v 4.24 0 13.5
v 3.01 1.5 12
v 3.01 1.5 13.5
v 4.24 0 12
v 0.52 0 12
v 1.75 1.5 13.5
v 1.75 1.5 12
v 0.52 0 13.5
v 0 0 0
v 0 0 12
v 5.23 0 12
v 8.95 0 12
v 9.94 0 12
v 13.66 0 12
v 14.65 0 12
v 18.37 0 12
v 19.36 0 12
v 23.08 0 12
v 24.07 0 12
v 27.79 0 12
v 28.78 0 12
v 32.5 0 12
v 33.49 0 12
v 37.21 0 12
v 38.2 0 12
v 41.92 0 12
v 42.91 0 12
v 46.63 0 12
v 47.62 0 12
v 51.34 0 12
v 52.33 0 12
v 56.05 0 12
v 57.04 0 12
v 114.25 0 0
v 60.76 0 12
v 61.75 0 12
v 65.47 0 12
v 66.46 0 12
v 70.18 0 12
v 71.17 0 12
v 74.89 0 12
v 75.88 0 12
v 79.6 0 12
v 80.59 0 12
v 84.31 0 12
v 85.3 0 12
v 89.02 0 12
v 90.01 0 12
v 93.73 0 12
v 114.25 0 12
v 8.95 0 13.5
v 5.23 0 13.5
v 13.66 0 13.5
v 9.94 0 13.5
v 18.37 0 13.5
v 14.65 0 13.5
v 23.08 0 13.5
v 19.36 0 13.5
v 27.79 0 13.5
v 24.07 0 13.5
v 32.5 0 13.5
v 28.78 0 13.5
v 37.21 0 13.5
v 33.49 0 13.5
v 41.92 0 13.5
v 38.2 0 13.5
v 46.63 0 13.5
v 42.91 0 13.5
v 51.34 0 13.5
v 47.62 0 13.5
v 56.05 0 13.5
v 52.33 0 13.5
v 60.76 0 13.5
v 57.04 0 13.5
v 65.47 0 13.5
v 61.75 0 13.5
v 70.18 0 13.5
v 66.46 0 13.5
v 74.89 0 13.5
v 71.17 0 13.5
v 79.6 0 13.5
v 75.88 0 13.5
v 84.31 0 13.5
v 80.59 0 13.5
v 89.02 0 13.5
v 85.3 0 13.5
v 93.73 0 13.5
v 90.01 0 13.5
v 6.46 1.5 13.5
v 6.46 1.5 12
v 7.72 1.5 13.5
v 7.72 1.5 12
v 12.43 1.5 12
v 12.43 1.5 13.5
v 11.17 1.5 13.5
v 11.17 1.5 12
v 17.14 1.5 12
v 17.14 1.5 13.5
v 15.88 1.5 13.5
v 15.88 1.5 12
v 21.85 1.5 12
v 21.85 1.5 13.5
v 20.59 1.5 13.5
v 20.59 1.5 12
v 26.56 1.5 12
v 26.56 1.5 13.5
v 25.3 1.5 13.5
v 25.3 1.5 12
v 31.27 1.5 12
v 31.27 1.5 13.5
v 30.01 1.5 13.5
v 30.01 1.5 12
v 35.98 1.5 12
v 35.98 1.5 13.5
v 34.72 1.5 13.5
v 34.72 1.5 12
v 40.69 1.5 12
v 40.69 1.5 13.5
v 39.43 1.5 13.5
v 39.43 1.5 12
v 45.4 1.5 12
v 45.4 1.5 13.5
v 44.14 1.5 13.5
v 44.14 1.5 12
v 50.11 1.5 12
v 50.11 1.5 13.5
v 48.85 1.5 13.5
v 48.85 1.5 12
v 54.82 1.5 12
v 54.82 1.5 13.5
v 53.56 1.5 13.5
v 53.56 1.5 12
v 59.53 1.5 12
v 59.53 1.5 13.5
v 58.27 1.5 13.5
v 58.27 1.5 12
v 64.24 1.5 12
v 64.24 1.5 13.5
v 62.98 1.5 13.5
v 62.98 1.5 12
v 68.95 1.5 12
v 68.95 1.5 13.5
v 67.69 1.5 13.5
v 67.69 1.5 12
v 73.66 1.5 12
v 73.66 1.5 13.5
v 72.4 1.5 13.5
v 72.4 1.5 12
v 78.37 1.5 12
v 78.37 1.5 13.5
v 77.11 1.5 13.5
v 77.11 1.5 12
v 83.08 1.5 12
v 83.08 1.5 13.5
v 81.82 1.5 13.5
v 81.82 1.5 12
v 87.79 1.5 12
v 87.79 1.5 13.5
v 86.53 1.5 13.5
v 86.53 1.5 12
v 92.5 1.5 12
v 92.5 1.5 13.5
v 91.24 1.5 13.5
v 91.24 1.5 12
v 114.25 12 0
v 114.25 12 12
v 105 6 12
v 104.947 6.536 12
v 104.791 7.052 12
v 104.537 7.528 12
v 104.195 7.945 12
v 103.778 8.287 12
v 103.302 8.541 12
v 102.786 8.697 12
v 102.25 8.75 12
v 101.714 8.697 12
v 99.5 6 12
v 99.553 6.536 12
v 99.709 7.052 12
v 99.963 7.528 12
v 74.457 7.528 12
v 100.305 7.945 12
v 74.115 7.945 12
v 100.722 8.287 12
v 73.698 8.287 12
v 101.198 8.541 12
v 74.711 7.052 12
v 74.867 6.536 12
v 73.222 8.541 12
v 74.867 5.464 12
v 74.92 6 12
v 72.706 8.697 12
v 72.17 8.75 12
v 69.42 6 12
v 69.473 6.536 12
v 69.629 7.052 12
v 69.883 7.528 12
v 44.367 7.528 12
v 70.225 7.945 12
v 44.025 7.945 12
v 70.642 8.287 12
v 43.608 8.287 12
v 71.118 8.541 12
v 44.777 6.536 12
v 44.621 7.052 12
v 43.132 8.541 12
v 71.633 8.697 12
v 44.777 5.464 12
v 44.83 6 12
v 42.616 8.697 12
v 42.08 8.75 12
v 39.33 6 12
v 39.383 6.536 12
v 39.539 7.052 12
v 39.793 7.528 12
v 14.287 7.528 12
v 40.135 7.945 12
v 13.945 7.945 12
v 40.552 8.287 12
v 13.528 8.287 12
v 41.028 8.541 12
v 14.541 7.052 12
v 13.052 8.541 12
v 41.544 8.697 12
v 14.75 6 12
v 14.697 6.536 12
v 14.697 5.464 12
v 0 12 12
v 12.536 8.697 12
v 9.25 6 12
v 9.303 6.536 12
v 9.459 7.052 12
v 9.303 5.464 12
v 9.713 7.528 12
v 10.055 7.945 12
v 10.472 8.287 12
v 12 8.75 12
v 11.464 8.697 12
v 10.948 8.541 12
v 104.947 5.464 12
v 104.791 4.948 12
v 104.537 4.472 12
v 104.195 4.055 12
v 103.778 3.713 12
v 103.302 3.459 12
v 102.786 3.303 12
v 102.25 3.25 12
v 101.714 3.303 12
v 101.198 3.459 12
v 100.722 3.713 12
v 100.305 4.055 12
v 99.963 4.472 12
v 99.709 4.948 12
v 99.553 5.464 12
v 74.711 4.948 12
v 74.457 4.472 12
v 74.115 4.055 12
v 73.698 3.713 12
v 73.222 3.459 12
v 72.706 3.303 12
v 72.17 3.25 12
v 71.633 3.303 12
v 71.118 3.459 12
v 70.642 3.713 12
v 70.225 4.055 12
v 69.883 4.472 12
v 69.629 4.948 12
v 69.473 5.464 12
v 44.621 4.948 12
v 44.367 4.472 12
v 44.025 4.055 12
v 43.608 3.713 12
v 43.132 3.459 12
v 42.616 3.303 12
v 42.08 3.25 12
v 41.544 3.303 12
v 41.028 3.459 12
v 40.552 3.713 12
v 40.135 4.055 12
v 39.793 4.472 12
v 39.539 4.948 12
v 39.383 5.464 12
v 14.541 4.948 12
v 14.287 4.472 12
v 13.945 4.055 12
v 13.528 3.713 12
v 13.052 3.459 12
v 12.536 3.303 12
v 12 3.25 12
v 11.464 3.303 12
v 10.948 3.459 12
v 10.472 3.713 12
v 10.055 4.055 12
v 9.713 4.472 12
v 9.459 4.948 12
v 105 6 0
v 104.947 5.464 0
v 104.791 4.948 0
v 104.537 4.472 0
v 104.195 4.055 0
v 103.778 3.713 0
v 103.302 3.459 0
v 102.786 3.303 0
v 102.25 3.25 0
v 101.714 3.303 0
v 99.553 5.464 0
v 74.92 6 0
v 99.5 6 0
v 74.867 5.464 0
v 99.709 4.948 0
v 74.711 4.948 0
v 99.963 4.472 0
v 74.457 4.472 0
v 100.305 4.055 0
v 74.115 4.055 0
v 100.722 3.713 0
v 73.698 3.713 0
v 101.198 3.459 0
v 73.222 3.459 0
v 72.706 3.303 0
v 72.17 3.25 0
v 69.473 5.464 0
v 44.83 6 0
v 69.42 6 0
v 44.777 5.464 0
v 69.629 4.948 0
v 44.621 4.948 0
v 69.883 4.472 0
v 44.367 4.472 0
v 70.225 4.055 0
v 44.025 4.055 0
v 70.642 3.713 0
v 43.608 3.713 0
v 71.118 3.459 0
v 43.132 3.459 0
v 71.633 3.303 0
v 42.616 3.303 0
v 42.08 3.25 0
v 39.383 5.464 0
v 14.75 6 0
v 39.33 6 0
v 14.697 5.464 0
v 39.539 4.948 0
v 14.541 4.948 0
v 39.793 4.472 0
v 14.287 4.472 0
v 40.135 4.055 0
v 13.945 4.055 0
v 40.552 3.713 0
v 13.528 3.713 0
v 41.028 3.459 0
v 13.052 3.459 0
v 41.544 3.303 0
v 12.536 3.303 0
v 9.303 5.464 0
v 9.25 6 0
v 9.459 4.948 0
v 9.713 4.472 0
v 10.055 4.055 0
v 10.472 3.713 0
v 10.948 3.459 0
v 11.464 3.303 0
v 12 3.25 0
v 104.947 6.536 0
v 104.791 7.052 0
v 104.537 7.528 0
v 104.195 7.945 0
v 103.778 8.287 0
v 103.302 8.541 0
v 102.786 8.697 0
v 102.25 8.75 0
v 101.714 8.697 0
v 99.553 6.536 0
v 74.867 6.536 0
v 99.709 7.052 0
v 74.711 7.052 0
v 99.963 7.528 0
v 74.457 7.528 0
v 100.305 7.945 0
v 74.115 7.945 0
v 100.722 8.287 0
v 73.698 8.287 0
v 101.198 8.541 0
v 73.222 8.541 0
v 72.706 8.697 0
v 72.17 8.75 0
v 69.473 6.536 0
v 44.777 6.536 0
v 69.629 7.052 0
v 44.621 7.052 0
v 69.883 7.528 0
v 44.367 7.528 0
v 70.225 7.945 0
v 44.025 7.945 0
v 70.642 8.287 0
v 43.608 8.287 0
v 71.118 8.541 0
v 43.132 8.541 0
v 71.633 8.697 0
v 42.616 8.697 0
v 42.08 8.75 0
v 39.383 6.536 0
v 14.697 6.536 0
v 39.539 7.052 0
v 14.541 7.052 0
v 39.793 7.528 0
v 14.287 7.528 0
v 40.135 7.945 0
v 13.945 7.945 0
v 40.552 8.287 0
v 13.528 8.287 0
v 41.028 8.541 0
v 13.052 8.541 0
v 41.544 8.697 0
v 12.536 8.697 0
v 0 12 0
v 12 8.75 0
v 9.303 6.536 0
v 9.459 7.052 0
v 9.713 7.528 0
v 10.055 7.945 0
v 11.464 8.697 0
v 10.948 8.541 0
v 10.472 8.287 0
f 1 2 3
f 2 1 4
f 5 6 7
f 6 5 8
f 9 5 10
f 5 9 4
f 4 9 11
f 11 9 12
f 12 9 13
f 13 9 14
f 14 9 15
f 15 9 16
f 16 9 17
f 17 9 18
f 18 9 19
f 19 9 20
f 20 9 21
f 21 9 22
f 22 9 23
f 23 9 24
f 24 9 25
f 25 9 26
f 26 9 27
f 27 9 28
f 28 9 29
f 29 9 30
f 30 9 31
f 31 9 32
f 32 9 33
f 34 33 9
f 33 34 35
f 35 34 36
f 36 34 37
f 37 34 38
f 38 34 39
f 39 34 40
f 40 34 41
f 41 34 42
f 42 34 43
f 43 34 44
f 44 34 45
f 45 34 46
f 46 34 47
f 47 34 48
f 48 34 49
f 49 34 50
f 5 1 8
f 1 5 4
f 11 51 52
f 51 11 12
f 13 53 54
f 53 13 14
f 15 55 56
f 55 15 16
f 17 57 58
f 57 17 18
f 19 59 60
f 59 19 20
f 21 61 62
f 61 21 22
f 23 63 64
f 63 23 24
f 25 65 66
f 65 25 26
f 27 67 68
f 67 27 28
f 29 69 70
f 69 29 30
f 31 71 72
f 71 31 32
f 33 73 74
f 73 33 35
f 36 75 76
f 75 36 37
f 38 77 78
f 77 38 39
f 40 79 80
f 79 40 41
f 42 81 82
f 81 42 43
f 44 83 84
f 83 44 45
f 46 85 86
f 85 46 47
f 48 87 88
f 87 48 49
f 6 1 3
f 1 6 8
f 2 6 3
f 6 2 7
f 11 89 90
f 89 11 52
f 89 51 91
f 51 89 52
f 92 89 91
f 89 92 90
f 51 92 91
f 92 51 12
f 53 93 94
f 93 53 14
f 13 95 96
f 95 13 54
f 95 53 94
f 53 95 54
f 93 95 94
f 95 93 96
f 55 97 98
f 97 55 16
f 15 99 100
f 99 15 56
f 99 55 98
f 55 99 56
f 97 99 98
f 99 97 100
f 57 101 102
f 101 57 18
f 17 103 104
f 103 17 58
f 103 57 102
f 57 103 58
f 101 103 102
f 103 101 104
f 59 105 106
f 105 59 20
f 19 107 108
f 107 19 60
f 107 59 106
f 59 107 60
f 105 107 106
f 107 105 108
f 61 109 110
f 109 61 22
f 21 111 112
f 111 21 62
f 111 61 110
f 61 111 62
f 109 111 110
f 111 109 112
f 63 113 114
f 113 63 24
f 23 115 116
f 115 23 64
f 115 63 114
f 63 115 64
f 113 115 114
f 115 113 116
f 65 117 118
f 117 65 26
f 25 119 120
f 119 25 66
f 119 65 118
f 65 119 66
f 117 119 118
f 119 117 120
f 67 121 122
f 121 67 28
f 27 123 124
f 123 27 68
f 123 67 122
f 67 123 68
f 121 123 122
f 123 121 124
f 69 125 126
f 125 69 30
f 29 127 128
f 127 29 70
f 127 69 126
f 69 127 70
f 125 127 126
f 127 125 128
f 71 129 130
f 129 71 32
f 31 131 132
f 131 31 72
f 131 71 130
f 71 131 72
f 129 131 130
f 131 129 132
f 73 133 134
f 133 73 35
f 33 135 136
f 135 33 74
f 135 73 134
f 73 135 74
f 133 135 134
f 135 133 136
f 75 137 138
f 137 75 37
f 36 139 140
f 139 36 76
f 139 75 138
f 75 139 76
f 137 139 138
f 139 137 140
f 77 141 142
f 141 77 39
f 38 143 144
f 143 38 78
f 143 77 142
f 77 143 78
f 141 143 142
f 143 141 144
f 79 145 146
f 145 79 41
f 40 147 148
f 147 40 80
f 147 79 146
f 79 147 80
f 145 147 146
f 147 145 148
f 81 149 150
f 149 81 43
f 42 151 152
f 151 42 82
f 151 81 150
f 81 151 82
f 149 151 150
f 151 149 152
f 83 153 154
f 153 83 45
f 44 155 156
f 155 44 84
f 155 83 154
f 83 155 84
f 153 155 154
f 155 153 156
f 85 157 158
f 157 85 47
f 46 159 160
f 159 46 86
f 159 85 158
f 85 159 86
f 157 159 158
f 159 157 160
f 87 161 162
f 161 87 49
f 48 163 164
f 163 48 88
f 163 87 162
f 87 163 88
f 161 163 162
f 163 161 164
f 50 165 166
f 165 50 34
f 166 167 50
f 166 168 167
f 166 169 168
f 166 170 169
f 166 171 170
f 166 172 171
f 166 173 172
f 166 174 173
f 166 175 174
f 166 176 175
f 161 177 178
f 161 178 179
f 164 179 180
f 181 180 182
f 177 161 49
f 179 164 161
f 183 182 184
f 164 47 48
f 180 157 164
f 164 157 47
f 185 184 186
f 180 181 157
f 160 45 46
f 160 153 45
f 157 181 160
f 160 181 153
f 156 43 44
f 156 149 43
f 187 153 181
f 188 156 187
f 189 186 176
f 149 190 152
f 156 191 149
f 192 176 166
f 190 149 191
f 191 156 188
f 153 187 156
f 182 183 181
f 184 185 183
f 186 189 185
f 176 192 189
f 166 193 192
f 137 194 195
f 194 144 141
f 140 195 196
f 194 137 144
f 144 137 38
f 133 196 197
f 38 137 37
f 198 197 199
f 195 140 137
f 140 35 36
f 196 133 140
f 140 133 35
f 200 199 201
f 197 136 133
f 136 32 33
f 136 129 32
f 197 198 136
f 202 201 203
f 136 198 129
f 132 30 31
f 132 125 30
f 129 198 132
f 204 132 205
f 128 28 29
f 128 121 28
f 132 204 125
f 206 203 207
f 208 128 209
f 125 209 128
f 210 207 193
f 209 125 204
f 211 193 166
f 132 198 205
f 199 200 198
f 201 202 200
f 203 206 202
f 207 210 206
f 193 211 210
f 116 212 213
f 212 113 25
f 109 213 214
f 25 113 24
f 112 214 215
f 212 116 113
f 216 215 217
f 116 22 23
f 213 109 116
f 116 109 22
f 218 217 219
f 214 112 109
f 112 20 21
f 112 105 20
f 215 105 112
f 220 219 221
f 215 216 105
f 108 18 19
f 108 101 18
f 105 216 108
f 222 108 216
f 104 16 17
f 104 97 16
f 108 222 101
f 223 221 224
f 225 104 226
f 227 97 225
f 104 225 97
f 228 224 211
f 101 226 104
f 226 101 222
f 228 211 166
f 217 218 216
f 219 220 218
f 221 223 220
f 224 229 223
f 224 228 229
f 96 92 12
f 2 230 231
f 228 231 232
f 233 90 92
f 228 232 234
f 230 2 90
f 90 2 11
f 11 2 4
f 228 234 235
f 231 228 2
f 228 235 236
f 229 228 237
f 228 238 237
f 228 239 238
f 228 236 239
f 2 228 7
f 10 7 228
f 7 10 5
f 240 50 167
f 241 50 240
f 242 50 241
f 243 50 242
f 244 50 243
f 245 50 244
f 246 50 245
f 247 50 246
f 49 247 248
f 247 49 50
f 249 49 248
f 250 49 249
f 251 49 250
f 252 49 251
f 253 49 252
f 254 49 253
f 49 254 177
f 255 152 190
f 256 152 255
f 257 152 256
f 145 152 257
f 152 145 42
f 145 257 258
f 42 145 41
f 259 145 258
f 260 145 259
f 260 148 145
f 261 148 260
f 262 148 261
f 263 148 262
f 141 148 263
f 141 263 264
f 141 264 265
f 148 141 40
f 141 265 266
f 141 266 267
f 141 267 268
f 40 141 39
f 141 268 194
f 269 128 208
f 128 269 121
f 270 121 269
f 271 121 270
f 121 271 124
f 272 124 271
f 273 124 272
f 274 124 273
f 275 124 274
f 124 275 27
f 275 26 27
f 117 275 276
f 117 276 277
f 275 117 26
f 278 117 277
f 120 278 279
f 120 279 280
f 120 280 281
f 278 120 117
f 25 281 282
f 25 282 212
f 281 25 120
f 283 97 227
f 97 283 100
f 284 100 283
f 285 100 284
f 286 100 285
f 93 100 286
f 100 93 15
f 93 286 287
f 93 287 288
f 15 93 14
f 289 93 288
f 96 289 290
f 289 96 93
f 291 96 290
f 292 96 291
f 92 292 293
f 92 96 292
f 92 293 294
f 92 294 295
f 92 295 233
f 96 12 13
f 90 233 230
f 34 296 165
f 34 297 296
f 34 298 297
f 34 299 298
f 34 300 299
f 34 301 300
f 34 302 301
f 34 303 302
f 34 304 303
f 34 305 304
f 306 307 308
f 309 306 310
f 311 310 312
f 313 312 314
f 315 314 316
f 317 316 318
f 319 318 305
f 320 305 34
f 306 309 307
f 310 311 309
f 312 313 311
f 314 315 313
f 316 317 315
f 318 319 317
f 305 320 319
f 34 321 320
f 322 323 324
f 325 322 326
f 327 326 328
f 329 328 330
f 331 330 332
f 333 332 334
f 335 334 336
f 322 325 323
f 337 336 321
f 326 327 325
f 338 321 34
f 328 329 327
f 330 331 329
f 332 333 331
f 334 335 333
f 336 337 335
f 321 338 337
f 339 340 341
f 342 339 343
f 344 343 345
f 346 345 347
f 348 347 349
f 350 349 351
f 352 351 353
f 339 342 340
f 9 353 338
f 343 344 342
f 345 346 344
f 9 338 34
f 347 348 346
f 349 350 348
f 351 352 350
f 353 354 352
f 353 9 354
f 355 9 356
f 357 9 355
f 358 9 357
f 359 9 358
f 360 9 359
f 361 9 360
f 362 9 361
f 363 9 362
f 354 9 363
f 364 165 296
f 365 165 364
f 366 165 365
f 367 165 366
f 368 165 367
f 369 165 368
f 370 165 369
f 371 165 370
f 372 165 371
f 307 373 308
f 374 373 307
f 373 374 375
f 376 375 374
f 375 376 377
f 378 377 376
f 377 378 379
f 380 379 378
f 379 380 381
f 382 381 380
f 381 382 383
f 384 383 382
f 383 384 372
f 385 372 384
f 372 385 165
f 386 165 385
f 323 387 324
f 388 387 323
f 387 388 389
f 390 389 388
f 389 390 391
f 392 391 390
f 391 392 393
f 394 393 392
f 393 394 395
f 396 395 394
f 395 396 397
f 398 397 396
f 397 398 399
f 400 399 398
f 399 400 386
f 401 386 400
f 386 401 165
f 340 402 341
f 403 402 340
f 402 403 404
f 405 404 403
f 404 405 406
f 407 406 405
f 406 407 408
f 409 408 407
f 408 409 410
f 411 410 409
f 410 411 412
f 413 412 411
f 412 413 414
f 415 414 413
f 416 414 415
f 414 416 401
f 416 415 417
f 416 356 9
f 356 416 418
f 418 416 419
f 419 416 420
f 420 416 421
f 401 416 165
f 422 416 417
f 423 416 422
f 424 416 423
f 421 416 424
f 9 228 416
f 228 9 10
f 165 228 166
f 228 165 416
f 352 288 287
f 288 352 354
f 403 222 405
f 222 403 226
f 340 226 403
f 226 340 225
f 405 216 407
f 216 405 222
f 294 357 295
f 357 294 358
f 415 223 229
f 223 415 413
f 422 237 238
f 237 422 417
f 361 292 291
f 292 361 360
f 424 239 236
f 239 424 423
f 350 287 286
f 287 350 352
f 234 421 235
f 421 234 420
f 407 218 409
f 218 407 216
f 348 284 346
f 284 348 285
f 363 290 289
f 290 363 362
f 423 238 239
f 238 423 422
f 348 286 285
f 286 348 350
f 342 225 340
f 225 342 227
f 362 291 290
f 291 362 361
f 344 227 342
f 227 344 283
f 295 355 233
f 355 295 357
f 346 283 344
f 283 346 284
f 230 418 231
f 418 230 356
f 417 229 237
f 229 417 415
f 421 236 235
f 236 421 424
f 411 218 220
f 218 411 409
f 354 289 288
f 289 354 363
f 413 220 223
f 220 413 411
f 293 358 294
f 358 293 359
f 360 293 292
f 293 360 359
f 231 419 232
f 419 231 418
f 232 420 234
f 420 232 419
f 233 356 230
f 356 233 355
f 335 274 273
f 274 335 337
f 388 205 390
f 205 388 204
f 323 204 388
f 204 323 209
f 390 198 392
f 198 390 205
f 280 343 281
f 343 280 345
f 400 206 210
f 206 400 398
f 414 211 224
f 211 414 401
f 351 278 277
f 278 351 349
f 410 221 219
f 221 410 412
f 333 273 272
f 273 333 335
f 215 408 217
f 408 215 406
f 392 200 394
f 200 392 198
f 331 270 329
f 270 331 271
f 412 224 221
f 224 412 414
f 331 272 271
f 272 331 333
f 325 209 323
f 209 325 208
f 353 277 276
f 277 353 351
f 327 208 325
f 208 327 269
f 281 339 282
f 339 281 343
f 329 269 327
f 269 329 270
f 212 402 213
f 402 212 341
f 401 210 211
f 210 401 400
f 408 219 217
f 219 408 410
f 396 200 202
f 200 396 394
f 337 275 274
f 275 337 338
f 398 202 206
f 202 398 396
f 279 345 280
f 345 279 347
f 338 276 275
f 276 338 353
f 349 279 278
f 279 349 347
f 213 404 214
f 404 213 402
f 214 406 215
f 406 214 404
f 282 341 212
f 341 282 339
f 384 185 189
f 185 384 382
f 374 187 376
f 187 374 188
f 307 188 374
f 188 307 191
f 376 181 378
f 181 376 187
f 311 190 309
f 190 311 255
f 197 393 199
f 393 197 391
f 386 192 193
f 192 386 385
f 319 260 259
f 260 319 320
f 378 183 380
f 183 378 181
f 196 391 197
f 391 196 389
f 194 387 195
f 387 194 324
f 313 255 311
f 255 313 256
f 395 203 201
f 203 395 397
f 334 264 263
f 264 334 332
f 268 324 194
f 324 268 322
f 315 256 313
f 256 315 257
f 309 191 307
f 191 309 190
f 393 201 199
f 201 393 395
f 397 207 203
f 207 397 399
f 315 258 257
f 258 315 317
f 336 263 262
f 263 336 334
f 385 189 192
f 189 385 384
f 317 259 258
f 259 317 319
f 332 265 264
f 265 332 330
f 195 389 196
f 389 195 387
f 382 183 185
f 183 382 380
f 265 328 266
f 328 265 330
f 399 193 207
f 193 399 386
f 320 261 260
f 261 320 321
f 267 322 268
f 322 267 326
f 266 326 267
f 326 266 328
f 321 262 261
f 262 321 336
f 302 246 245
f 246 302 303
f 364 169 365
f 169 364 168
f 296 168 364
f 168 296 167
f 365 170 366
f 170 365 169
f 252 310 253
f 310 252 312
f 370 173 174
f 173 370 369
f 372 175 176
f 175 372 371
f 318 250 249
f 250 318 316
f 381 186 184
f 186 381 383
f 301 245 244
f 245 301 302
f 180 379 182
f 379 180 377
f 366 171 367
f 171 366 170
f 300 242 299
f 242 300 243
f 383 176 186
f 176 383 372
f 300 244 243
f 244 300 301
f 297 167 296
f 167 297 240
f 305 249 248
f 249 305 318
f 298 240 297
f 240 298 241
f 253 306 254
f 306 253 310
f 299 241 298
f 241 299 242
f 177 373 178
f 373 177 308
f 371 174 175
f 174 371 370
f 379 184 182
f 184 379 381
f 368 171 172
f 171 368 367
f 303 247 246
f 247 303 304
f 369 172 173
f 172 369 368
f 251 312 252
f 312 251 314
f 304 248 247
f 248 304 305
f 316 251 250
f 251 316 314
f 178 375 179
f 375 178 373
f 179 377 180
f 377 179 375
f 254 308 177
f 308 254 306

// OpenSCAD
$fn = 32;

// ----------------------------------------------------------------------
// Gear rack: m=1.5 z=20, 114.25 x 12 x 13.5 mm
// ----------------------------------------------------------------------

// --- parameters (mm) ---
rack_len = 114.25;        // rack length, X
rack_w = 12;              // rack width, Y
rack_h = 13.5;            // overall height, Z
modul = 1.5;              // module
body_t = 12;              // tooth root line height
pitch = 4.71;             // circular pitch
tip_w = 1.26;             // tooth thickness at the tip
root_w = 3.72;            // tooth thickness at the root line
hole_d = 5.5;             // mounting hole
sink = 0.6;               // tooth root overlap into the body

tooth_span = 94.25;

module tooth(x0) {
  /* 20 deg flank profile, sunk into the body for a positive overlap */
  translate([x0, 0, body_t - sink])
    linear_extrude(height = rack_h - body_t + sink)
      polygon(points = [[-root_w / 2, 0], [root_w / 2, 0],
                        [tip_w / 2, rack_h - body_t],
                        [-tip_w / 2, rack_h - body_t]]);
}

difference() {
  union() {
    cube([rack_len, rack_w, body_t]);
    for (i = [0 : 20 - 1])
      tooth((i + 0.5) * pitch + (tooth_span - 20 * pitch) / 2);
  }
  translate([12, 6, -1]) cylinder(h = body_t + 2, d = hole_d);
  translate([42.08, 6, -1]) cylinder(h = body_t + 2, d = hole_d);
  translate([72.17, 6, -1]) cylinder(h = body_t + 2, d = hole_d);
  translate([102.25, 6, -1]) cylinder(h = body_t + 2, d = hole_d);
}
